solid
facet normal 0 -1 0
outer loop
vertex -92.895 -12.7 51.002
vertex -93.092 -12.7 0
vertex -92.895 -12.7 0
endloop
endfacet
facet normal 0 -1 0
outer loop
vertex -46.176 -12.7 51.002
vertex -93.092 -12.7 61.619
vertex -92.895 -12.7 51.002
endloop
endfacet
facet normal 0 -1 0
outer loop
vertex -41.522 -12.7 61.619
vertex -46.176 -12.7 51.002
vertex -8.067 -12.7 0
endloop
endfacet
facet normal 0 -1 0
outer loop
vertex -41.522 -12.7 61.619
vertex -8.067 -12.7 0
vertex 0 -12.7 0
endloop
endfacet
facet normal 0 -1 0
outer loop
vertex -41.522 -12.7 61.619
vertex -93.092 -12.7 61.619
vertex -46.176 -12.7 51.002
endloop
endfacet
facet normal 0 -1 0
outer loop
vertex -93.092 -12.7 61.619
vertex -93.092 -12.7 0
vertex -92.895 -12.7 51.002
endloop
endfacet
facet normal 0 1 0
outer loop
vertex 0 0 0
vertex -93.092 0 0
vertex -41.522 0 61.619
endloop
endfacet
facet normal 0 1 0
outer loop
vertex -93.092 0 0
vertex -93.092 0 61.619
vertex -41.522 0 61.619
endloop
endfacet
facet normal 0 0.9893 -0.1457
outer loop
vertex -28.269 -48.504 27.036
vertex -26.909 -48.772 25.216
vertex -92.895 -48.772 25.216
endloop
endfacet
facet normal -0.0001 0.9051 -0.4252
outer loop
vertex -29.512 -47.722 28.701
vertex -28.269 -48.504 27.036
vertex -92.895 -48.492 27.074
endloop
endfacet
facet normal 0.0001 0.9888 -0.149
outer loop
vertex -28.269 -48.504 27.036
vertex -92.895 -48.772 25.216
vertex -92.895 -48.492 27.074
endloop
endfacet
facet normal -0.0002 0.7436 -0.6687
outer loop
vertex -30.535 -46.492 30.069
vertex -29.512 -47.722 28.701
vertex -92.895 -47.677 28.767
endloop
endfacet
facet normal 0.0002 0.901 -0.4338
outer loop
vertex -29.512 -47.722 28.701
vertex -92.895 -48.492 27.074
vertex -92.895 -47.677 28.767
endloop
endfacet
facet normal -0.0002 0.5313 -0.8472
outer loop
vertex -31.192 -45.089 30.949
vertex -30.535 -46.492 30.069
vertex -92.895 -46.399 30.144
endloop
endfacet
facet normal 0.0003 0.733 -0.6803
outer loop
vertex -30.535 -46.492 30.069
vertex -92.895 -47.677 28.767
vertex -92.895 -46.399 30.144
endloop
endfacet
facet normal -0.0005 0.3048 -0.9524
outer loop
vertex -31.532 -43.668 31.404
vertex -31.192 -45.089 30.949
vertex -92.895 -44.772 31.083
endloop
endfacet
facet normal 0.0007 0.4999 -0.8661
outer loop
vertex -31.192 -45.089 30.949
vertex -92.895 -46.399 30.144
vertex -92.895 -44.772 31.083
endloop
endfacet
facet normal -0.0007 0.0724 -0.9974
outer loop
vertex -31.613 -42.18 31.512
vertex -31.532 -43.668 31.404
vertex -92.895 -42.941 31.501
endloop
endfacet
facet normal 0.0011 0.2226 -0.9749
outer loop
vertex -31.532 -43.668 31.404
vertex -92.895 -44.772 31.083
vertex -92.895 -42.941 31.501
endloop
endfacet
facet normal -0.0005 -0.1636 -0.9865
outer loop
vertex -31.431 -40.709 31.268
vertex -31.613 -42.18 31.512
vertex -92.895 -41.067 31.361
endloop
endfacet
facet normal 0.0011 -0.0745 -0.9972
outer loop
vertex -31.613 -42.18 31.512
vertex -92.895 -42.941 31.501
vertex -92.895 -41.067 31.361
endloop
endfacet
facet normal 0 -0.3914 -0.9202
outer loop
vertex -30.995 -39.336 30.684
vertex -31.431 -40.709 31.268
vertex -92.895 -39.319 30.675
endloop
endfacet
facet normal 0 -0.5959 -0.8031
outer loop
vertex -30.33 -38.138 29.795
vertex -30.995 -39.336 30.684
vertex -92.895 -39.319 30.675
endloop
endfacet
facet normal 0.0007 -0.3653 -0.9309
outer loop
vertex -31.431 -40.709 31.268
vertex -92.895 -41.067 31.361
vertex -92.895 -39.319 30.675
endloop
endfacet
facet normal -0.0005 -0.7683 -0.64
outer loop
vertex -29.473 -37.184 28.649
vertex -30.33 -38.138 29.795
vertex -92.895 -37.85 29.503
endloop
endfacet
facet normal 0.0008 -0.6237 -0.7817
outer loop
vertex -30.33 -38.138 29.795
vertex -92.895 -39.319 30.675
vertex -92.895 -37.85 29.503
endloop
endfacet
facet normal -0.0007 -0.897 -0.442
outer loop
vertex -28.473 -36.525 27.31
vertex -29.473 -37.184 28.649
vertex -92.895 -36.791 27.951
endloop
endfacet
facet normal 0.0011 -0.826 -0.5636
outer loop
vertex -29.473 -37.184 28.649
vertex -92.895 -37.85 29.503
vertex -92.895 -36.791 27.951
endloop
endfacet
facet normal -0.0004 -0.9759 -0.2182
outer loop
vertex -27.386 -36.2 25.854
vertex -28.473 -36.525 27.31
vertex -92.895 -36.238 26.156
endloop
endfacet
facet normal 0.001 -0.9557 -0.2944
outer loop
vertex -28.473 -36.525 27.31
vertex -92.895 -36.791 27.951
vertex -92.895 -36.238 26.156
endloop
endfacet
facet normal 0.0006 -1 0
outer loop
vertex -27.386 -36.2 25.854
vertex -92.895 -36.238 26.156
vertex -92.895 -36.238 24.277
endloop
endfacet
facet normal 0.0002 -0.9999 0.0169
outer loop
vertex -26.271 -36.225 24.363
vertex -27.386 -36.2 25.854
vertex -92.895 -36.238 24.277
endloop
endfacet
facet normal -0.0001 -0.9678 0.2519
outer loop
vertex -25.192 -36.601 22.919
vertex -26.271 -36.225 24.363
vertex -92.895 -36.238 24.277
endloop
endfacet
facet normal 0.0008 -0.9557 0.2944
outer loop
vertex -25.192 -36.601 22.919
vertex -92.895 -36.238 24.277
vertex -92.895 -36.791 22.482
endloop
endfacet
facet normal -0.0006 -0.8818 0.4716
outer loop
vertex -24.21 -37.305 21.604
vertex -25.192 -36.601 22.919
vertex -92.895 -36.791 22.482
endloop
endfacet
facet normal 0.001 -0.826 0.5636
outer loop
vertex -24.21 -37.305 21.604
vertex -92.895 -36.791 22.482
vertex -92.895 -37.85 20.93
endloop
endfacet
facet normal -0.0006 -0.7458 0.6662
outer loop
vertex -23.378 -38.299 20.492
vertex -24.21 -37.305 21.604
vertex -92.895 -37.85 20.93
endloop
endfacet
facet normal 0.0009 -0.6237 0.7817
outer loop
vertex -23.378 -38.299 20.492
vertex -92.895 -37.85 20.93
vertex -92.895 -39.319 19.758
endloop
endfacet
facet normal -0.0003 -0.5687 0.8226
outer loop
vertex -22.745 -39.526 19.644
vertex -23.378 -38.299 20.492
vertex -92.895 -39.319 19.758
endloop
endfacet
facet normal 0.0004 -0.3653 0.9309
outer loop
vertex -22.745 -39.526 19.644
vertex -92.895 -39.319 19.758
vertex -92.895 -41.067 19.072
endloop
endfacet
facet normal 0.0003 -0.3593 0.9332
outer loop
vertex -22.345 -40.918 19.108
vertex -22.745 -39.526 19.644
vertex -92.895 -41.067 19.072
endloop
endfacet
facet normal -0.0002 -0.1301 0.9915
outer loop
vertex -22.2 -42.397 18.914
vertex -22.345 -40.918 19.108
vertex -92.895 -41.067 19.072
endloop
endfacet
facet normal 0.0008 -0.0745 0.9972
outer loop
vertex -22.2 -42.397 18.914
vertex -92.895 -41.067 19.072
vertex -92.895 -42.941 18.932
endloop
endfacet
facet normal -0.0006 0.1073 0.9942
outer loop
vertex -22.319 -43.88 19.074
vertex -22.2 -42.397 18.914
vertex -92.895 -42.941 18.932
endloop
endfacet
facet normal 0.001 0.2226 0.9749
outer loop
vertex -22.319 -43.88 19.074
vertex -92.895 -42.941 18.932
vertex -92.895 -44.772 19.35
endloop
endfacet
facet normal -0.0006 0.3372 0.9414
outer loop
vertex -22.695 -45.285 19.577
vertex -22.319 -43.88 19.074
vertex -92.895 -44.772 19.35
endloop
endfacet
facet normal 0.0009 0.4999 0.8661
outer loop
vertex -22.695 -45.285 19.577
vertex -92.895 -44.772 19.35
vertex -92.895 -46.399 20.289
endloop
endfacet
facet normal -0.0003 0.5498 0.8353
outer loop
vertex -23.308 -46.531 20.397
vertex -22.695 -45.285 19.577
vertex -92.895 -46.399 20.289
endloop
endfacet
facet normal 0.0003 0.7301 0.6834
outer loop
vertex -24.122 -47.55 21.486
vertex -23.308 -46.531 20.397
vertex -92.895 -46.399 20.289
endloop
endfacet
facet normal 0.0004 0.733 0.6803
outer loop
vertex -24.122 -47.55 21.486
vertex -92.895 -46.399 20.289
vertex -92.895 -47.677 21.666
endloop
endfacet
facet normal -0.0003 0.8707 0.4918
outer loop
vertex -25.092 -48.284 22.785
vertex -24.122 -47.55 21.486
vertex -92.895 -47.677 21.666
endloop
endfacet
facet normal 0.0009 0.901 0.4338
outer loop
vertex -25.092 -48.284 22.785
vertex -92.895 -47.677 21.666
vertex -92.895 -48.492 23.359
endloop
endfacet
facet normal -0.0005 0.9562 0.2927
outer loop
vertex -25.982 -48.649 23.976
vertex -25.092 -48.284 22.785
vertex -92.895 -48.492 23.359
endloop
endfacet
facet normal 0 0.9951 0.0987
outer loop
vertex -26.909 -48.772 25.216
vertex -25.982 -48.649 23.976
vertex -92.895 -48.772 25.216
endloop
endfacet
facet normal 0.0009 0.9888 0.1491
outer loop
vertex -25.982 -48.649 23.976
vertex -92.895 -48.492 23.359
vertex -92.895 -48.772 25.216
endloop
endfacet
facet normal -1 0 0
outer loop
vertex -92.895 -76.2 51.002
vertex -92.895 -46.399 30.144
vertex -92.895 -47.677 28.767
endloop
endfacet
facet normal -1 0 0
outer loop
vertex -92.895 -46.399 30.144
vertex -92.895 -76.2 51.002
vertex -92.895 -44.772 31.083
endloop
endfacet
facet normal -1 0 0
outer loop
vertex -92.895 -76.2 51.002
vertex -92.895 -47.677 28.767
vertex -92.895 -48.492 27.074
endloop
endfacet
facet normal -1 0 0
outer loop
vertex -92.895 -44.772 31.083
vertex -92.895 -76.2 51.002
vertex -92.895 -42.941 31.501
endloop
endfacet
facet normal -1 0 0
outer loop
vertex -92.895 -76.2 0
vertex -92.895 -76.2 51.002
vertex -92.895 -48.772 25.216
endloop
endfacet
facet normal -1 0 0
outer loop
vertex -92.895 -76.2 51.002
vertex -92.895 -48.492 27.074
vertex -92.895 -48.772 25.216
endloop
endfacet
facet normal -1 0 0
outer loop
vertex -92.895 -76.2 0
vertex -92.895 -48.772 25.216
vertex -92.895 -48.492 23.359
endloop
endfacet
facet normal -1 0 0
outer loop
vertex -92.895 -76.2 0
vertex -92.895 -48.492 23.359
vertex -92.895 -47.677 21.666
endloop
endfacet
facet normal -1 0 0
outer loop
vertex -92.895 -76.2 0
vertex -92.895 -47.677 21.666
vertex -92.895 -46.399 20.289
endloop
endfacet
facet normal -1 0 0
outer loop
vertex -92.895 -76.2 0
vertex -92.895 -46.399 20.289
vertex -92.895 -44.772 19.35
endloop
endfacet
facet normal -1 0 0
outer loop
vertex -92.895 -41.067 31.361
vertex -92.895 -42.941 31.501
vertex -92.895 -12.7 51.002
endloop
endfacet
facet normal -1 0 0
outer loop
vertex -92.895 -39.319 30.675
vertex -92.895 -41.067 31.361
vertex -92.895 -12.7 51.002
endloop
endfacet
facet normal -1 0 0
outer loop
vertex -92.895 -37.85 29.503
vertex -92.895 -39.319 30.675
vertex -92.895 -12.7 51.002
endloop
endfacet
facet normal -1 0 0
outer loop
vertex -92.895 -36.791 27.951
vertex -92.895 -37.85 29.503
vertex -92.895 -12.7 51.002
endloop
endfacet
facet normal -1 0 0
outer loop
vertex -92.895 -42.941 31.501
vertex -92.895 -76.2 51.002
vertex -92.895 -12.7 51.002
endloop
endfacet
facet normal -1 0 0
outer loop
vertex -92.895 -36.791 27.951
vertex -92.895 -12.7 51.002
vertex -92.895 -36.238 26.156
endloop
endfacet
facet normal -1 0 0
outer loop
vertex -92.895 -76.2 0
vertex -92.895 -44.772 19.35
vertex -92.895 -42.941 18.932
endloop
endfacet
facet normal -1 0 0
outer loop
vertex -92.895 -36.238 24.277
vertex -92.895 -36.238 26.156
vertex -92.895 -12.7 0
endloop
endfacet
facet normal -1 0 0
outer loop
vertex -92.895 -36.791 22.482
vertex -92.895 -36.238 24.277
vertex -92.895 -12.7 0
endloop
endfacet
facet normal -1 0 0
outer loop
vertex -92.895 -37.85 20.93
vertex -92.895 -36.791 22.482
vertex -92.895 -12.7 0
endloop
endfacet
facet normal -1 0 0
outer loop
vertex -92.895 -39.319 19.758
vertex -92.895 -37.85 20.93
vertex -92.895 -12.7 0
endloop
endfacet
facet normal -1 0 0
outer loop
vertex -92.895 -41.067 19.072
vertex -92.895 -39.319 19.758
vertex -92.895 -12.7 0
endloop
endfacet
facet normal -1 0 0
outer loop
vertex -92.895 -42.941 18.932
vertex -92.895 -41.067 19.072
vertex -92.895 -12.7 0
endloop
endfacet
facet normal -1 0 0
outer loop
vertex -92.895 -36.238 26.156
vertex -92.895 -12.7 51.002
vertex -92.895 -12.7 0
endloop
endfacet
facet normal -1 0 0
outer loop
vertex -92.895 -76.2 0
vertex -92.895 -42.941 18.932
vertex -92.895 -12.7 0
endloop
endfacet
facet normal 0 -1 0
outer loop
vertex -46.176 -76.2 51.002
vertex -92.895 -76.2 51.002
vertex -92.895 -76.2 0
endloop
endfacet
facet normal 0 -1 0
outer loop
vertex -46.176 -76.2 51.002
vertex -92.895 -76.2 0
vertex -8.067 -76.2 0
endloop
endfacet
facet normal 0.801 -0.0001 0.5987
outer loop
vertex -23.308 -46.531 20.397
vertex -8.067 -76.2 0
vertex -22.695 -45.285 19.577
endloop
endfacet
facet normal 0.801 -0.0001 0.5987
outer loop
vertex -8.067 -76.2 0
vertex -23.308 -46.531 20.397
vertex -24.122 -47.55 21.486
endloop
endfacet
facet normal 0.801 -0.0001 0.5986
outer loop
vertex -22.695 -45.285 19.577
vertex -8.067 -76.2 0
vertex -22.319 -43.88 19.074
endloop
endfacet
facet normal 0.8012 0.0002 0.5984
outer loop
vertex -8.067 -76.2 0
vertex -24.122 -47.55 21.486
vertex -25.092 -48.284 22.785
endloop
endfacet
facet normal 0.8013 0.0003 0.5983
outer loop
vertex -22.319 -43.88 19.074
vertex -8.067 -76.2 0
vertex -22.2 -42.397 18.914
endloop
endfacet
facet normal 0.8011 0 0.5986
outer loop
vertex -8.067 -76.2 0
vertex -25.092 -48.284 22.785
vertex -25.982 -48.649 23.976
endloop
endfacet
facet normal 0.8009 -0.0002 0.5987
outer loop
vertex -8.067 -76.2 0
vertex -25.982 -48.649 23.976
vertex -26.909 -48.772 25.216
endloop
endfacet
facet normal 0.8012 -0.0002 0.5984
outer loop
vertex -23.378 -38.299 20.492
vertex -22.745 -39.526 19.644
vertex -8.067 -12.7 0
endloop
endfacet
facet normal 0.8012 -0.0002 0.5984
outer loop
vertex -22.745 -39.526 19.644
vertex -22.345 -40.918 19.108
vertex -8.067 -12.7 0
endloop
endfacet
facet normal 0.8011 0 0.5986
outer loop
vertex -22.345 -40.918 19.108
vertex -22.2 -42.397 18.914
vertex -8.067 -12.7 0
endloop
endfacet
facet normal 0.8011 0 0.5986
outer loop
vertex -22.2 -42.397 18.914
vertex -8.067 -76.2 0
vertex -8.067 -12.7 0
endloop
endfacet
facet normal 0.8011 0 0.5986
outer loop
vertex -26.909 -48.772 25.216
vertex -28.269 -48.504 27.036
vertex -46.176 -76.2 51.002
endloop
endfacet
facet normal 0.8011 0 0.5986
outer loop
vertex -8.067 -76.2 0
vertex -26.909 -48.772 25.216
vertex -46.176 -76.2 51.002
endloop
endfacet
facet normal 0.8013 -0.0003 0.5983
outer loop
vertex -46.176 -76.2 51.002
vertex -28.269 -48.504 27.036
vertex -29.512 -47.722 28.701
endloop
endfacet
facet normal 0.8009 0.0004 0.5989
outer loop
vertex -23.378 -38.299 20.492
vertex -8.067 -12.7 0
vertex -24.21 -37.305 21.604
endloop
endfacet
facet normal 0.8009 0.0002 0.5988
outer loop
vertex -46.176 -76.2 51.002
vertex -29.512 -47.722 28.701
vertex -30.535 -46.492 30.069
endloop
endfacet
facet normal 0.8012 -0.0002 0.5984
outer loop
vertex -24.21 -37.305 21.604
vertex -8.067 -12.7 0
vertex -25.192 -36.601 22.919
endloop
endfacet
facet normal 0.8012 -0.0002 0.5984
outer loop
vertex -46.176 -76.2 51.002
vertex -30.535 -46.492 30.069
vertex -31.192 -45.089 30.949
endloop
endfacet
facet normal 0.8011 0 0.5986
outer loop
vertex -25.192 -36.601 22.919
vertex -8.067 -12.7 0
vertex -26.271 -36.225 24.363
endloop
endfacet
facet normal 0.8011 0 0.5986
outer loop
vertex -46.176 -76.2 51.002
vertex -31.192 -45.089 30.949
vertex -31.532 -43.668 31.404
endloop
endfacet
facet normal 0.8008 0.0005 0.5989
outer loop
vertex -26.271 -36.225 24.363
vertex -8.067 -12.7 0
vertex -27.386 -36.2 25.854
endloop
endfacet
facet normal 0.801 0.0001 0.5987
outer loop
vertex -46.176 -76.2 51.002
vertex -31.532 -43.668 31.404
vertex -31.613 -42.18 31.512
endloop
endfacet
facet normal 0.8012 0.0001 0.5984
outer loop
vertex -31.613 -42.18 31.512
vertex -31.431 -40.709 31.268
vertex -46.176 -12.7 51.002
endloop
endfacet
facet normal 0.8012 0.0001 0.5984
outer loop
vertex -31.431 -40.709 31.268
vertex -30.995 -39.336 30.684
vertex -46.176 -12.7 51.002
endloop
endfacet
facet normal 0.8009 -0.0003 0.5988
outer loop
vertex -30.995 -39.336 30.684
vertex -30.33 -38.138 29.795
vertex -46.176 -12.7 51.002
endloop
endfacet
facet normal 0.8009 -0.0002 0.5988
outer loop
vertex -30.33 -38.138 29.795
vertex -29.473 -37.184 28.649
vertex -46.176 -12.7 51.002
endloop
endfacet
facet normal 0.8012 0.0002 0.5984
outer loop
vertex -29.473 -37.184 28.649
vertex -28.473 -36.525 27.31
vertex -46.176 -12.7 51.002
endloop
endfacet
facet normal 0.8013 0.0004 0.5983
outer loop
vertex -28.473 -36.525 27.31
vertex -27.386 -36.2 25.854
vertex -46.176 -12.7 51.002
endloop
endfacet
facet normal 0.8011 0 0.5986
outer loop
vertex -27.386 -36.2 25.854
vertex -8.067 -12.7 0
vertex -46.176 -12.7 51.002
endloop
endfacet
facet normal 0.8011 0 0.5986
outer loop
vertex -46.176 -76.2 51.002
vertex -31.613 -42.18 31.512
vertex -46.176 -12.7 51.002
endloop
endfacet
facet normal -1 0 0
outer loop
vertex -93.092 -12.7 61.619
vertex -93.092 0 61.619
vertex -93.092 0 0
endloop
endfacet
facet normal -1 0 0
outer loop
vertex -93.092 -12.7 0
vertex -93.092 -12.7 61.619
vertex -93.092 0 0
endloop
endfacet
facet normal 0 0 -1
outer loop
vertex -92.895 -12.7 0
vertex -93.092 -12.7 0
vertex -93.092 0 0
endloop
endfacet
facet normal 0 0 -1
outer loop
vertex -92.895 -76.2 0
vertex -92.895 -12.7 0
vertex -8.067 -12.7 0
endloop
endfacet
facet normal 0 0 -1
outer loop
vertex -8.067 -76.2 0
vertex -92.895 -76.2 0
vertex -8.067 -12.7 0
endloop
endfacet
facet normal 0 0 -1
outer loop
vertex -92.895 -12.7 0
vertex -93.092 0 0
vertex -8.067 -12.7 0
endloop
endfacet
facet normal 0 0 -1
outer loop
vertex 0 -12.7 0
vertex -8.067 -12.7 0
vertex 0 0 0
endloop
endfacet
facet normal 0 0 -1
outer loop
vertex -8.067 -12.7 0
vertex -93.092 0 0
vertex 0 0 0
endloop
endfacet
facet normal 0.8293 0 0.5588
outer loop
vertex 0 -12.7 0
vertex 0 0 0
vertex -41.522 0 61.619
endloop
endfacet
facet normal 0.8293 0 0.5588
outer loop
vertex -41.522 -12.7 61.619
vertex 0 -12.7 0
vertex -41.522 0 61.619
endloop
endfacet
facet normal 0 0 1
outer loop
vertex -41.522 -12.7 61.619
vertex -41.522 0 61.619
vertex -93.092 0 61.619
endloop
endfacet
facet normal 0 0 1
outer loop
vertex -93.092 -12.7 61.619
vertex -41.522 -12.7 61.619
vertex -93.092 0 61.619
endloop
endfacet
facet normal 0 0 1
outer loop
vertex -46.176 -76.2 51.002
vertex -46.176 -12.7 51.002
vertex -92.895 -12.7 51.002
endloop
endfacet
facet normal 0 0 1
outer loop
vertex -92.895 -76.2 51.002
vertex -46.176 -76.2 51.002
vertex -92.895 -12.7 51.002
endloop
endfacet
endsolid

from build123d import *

# Parameters (mm, degrees)
F1_DEPTH = 12.7
F3_DEPTH = 63.5
F4_R     = 6.3025
F5_DEPTH = 92.896292


with BuildPart() as f1:
    # F0 (on Front) → F1 (new body)
    with BuildSketch(Plane.XZ):
        Polygon((-93.092211, 0), (0, 0), (-41.521776, 61.619077), (-93.092211, 61.619077), align=None)
    extrude(amount=F1_DEPTH)

    # F2 (on face) → F3 (join)
    with BuildSketch(Plane.XZ.offset(12.7)):
        Polygon((-92.895292, 51.001634), (-92.895292, 0), (-8.06691, 0), (-46.175938, 51.001634), align=None)
    extrude(amount=F3_DEPTH)

    # F4 (on face) → F5 (cut, through all)
    with BuildSketch(Plane(origin=(-92.895292, 0, 0), x_dir=(0, -1, 0), z_dir=(-1, 0, 0))):
        with Locations((42.469766, 25.216423)):
            Circle(F4_R)
    extrude(amount=-F5_DEPTH, mode=Mode.SUBTRACT)


solid = f1.part
